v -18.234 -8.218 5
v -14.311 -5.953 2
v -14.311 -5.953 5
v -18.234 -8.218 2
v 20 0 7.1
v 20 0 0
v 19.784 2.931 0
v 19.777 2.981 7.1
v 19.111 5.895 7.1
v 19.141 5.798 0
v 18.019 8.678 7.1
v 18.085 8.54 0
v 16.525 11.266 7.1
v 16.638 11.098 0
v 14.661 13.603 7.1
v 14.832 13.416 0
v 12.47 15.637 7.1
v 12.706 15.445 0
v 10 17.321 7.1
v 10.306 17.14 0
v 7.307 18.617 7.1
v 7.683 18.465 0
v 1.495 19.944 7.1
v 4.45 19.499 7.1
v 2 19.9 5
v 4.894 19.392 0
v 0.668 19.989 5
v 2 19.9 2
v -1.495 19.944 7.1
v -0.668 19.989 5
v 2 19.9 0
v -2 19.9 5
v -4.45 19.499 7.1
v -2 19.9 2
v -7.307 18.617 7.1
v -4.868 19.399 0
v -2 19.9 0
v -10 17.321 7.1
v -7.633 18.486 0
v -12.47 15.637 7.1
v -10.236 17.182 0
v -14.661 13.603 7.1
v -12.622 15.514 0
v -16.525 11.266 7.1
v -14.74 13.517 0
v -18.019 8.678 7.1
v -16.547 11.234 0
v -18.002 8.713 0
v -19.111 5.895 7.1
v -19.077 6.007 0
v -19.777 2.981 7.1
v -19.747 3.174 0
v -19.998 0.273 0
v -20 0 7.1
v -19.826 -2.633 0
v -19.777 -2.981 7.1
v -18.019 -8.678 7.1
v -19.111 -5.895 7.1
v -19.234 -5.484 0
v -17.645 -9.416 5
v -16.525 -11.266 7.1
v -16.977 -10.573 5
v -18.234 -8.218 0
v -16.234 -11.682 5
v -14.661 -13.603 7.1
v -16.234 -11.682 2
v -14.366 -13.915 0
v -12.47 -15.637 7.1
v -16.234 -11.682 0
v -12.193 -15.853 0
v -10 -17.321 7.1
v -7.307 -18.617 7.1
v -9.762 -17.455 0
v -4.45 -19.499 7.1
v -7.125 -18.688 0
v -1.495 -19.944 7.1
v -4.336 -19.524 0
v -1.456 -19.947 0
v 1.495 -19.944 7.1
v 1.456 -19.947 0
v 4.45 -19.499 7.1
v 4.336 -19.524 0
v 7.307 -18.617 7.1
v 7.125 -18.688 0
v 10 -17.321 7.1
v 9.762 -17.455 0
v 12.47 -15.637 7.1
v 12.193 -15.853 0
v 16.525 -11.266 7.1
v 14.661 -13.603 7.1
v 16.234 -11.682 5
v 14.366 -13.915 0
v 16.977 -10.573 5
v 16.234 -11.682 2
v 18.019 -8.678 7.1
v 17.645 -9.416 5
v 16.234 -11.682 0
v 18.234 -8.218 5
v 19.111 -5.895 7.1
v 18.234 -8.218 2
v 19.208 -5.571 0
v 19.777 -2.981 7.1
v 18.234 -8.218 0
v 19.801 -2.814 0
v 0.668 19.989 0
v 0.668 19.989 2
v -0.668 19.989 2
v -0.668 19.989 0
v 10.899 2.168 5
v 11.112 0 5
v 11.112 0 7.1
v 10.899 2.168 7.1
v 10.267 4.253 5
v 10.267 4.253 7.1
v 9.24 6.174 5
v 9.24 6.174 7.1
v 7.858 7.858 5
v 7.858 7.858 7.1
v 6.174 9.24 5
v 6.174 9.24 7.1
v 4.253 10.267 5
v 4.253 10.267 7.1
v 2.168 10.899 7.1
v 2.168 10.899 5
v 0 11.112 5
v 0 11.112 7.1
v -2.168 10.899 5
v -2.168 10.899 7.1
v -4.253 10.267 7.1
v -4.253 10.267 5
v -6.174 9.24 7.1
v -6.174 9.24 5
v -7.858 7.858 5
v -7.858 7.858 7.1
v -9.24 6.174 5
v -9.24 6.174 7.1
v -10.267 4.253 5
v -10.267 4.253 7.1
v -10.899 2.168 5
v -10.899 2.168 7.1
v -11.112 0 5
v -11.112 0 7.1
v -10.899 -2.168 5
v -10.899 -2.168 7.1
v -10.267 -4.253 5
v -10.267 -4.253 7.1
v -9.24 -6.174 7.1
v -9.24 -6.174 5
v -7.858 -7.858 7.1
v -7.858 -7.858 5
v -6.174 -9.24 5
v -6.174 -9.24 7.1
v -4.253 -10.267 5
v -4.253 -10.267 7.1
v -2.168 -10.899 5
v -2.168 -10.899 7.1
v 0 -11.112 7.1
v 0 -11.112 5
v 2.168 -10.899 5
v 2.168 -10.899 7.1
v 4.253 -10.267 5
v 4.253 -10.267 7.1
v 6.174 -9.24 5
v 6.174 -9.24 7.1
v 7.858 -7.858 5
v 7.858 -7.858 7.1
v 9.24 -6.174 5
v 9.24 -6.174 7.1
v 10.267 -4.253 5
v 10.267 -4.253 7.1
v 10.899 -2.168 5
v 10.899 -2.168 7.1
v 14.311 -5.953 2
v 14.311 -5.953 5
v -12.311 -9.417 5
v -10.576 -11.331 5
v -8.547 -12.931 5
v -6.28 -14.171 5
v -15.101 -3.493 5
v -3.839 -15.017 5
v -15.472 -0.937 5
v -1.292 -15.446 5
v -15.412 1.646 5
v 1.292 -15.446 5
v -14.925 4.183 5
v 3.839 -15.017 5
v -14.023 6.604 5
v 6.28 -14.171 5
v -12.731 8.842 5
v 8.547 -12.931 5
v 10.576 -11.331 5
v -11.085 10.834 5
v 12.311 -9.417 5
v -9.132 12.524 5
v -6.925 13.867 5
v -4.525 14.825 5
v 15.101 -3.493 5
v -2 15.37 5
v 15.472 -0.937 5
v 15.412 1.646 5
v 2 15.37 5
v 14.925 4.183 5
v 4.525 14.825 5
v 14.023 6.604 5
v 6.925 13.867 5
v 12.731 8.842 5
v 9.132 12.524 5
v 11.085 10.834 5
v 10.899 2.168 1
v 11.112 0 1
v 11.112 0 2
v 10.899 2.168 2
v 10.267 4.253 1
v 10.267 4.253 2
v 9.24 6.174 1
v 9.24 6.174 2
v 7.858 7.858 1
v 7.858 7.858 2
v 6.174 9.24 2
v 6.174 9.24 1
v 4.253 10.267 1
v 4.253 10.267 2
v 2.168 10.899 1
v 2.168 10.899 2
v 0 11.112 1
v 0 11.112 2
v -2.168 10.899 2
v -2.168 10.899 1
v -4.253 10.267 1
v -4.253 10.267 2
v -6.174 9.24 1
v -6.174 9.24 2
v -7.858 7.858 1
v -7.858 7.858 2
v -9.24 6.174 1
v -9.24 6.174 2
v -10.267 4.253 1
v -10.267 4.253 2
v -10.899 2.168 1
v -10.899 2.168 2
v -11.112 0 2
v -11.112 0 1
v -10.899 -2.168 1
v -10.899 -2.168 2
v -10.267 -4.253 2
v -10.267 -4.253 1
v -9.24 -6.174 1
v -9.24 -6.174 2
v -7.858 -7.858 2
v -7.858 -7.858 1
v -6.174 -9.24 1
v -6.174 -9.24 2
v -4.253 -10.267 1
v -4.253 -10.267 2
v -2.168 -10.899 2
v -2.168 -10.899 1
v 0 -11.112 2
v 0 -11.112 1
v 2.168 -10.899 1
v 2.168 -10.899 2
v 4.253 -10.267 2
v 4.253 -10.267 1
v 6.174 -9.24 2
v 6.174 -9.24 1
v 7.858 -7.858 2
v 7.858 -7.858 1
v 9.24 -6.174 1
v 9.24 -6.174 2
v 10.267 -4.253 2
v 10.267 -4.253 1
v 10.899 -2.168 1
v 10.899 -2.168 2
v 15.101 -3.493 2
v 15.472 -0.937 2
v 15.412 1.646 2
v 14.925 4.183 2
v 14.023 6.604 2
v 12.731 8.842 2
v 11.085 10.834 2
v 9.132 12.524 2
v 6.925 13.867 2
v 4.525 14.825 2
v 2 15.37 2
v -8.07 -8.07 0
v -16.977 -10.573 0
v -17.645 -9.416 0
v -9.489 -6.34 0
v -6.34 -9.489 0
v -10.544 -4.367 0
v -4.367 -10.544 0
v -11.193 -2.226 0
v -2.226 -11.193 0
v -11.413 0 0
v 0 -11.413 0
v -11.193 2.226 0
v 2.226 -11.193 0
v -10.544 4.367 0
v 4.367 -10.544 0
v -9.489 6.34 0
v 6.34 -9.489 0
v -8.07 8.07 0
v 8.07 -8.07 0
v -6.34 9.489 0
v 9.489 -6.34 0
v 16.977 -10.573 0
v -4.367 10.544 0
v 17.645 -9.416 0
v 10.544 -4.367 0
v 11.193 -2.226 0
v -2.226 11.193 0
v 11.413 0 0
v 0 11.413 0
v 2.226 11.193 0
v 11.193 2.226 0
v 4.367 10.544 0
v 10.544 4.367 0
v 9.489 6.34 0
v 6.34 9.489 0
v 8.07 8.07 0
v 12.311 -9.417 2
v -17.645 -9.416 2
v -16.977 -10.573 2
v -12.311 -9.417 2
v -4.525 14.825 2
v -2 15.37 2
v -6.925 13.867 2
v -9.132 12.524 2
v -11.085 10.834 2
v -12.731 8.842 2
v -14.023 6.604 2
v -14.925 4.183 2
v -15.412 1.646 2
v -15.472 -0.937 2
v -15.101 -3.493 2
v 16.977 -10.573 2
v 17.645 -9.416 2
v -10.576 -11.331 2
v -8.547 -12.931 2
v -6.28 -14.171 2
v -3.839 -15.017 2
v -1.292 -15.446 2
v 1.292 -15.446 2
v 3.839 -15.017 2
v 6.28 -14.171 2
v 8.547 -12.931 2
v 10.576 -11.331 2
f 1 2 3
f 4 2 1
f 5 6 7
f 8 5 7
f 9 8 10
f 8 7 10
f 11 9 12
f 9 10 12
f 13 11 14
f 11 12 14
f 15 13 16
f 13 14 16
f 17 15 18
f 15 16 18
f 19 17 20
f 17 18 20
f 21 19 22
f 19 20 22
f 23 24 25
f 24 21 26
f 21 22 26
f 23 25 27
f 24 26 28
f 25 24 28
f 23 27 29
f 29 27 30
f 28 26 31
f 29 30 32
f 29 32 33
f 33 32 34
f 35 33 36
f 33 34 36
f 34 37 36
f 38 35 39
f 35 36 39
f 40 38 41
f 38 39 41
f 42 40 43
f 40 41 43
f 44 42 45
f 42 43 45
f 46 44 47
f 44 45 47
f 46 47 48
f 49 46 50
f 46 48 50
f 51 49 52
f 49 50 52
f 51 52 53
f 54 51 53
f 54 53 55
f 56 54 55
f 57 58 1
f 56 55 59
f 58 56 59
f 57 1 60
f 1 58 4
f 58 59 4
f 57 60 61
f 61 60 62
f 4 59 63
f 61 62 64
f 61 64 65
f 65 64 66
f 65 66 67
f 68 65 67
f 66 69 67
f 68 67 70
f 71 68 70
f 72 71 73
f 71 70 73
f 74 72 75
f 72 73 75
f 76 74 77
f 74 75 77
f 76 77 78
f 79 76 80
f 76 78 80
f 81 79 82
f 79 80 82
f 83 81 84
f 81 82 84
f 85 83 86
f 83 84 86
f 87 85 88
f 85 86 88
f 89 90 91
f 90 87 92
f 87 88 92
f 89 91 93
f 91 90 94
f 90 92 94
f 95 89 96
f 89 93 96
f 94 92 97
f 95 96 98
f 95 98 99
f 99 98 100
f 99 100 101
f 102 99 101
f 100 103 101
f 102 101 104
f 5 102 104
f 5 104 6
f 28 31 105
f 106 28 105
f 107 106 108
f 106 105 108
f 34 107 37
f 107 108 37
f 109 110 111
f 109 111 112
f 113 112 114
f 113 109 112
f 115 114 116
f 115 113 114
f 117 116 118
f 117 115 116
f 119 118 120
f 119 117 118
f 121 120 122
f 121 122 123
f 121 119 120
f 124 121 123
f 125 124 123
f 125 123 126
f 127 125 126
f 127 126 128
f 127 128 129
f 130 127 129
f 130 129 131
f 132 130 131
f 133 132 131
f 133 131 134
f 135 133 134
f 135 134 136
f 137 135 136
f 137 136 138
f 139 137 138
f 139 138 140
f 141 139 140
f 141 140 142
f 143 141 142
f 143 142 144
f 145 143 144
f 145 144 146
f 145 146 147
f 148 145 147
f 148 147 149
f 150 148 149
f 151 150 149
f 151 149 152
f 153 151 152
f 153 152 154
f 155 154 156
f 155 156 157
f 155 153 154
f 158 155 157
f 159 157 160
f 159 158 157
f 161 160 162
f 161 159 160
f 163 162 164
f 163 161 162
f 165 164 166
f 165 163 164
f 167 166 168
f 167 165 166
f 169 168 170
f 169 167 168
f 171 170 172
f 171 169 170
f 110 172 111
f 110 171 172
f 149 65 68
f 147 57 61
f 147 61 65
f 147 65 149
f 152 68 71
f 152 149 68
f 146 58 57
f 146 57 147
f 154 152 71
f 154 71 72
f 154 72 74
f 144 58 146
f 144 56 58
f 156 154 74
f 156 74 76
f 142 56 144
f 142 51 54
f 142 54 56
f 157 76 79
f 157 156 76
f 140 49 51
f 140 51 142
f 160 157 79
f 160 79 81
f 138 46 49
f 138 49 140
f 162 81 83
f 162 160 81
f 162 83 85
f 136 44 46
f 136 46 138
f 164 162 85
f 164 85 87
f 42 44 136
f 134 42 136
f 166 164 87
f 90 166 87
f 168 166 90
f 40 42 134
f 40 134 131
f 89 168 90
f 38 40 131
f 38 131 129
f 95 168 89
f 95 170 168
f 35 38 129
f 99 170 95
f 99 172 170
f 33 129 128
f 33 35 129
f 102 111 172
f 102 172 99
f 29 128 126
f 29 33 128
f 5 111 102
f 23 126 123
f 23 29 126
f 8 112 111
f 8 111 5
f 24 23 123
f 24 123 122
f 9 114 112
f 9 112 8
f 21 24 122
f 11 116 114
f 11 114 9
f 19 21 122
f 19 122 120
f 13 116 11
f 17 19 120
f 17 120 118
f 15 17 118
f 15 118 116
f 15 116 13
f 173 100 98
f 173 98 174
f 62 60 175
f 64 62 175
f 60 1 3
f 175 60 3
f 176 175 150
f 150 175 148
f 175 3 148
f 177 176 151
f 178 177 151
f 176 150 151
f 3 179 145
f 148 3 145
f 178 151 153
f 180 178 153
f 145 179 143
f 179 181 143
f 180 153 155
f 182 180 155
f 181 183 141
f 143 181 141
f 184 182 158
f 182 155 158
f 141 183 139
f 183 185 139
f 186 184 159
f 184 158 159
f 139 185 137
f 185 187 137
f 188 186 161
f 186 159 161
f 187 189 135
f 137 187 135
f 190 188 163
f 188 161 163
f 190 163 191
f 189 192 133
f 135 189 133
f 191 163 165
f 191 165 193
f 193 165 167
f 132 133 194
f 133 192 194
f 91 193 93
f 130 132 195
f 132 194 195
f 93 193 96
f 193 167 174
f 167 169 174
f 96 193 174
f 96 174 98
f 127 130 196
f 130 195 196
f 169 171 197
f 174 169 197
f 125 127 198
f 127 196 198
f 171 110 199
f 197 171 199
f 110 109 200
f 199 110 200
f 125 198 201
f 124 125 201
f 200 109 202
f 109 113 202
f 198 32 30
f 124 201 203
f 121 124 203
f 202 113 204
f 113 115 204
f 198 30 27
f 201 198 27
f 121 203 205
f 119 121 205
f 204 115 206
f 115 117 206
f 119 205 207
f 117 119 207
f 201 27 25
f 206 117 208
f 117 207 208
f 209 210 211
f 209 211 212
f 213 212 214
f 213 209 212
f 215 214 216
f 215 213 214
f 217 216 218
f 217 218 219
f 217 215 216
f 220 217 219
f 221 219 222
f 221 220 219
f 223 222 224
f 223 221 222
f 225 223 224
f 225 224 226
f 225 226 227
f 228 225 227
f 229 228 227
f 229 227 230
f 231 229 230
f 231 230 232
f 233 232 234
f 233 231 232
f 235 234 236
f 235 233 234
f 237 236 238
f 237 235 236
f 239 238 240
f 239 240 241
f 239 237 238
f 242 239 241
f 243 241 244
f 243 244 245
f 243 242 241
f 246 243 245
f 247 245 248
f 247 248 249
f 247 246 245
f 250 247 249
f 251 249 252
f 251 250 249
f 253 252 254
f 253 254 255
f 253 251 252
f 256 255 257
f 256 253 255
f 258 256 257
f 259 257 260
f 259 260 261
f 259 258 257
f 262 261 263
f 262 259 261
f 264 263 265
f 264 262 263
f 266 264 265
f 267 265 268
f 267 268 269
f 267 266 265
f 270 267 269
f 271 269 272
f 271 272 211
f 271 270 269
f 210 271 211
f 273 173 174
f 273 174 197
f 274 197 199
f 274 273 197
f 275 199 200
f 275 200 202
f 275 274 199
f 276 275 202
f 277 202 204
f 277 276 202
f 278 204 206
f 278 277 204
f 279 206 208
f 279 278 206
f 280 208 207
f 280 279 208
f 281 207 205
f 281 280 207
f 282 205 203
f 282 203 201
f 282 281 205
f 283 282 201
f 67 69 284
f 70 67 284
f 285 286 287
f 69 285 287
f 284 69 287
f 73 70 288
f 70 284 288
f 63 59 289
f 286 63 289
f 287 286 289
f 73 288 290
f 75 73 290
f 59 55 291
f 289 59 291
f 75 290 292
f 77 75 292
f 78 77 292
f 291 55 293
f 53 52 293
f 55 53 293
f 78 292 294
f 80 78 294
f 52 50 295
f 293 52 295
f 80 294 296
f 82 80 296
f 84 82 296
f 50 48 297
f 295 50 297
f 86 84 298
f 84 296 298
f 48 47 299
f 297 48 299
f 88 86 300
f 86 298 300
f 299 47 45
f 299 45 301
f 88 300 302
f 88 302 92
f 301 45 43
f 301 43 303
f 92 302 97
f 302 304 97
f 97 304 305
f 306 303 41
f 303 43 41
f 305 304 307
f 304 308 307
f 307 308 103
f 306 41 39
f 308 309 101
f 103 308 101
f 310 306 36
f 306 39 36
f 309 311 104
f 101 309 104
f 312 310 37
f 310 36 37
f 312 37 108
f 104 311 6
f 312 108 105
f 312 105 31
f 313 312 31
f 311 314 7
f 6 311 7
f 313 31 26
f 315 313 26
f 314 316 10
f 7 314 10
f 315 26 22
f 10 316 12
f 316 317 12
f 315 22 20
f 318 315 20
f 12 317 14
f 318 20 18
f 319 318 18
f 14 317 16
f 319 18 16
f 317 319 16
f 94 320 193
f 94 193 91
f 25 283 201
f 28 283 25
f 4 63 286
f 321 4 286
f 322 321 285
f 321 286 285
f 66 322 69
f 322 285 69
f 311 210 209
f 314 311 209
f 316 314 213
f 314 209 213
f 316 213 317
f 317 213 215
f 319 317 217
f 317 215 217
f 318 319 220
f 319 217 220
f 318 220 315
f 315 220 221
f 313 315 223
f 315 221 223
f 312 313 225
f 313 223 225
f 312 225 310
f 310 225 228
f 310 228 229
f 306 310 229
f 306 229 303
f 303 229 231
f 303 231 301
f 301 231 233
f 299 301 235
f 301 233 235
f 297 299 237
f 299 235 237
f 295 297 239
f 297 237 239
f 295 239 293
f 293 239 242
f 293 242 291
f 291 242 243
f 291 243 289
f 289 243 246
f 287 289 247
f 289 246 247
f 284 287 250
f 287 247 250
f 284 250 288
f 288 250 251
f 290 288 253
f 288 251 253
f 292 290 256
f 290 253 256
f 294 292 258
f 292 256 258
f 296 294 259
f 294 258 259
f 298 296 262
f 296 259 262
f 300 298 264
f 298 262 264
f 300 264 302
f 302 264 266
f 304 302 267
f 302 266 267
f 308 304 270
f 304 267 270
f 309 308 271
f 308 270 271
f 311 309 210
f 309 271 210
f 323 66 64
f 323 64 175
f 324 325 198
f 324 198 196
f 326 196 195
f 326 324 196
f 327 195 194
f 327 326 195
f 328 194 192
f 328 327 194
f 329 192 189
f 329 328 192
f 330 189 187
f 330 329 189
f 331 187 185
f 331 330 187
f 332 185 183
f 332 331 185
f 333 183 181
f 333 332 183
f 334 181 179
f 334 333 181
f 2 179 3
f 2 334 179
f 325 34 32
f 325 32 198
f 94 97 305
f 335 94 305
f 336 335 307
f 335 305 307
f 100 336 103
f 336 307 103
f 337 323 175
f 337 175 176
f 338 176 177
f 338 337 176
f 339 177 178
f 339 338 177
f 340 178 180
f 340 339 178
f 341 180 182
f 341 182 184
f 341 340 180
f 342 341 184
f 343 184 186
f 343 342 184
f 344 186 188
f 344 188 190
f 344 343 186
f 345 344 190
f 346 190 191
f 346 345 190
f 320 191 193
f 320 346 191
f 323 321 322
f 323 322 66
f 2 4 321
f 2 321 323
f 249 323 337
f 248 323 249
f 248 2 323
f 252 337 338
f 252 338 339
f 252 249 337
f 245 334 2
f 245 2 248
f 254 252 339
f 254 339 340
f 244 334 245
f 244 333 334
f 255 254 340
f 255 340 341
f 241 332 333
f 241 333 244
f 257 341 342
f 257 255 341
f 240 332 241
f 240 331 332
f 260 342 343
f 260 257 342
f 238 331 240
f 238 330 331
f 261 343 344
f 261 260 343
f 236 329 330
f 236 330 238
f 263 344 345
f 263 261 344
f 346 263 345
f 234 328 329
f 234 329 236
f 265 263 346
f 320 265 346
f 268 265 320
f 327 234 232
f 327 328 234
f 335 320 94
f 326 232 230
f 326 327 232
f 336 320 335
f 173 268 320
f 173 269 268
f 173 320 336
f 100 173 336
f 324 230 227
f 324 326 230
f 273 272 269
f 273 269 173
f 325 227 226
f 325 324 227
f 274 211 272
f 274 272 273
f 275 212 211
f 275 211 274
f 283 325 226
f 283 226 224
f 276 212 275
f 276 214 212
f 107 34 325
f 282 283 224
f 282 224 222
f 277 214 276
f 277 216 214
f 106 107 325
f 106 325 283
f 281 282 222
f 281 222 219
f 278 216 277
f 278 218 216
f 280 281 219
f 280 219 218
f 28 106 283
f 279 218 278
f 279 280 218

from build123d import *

# Parameters (mm, degrees)
F0_R     = 20
F0_R_2   = 11.1125
F1_DEPTH = 7.1
F2_R     = 11.1125
F3_DEPTH = 5
F4_R     = 11.1125
F5_DEPTH = 2
F6_SIZE2 = 1
F6_SIZE  = 0.3


with BuildPart() as f1:
    # F0 (on Top) → F1 (new body)
    with BuildSketch(Plane.XY):
        Circle(F0_R)
        Circle(F0_R_2, mode=Mode.SUBTRACT)
    extrude(amount=F1_DEPTH)

    # F2 (on Top) → F3 (cut)
    with BuildSketch(Plane.XY):
        with BuildLine():
            Line((-2, 19.899749), (-2, 15.370426))
            ThreePointArc((-2, 15.370426), (-13.423394, 7.75), (-14.31118, -5.953162))
            Line((-14.31118, -5.953162), (-18.233688, -8.217824))
            ThreePointArc((-18.233688, -8.217824), (-17.320508, -10), (-16.233688, -11.681925))
            Line((-16.233688, -11.681925), (-12.31118, -9.417264))
            ThreePointArc((-12.31118, -9.417264), (0, -15.5), (12.31118, -9.417264))
            Line((12.31118, -9.417264), (16.233688, -11.681925))
            ThreePointArc((16.233688, -11.681925), (17.320508, -10), (18.233688, -8.217824))
            Line((18.233688, -8.217824), (14.31118, -5.953162))
            ThreePointArc((14.31118, -5.953162), (13.423394, 7.75), (2, 15.370426))
            Line((2, 15.370426), (2, 19.899749))
            ThreePointArc((2, 19.899749), (0, 20), (-2, 19.899749))
        make_face()
        Circle(F2_R, mode=Mode.SUBTRACT)
    extrude(amount=F3_DEPTH, mode=Mode.SUBTRACT)

    # F4 (on Top) → F5 (join)
    with BuildSketch(Plane.XY):
        with BuildLine():
            Line((-2, 19.899749), (-2, 15.370426))
            ThreePointArc((-2, 15.370426), (-13.423394, 7.75), (-14.31118, -5.953162))
            Line((-14.31118, -5.953162), (-18.233688, -8.217824))
            ThreePointArc((-18.233688, -8.217824), (-17.320508, -10), (-16.233688, -11.681925))
            Line((-16.233688, -11.681925), (-12.31118, -9.417264))
            ThreePointArc((-12.31118, -9.417264), (0, -15.5), (12.31118, -9.417264))
            Line((12.31118, -9.417264), (16.233688, -11.681925))
            ThreePointArc((16.233688, -11.681925), (17.320508, -10), (18.233688, -8.217824))
            Line((18.233688, -8.217824), (14.31118, -5.953162))
            ThreePointArc((14.31118, -5.953162), (13.423394, 7.75), (2, 15.370426))
            Line((2, 15.370426), (2, 19.899749))
            ThreePointArc((2, 19.899749), (0, 20), (-2, 19.899749))
        make_face()
        Circle(F4_R, mode=Mode.SUBTRACT)
    extrude(amount=F5_DEPTH)

    # F6
    f6_edges = [f1.edges().sort_by_distance(p)[0] for p in [
        (-11.1125, 0, 0),
    ]]
    chamfer(f6_edges, length=F6_SIZE, length2=F6_SIZE2)


solid = f1.part
